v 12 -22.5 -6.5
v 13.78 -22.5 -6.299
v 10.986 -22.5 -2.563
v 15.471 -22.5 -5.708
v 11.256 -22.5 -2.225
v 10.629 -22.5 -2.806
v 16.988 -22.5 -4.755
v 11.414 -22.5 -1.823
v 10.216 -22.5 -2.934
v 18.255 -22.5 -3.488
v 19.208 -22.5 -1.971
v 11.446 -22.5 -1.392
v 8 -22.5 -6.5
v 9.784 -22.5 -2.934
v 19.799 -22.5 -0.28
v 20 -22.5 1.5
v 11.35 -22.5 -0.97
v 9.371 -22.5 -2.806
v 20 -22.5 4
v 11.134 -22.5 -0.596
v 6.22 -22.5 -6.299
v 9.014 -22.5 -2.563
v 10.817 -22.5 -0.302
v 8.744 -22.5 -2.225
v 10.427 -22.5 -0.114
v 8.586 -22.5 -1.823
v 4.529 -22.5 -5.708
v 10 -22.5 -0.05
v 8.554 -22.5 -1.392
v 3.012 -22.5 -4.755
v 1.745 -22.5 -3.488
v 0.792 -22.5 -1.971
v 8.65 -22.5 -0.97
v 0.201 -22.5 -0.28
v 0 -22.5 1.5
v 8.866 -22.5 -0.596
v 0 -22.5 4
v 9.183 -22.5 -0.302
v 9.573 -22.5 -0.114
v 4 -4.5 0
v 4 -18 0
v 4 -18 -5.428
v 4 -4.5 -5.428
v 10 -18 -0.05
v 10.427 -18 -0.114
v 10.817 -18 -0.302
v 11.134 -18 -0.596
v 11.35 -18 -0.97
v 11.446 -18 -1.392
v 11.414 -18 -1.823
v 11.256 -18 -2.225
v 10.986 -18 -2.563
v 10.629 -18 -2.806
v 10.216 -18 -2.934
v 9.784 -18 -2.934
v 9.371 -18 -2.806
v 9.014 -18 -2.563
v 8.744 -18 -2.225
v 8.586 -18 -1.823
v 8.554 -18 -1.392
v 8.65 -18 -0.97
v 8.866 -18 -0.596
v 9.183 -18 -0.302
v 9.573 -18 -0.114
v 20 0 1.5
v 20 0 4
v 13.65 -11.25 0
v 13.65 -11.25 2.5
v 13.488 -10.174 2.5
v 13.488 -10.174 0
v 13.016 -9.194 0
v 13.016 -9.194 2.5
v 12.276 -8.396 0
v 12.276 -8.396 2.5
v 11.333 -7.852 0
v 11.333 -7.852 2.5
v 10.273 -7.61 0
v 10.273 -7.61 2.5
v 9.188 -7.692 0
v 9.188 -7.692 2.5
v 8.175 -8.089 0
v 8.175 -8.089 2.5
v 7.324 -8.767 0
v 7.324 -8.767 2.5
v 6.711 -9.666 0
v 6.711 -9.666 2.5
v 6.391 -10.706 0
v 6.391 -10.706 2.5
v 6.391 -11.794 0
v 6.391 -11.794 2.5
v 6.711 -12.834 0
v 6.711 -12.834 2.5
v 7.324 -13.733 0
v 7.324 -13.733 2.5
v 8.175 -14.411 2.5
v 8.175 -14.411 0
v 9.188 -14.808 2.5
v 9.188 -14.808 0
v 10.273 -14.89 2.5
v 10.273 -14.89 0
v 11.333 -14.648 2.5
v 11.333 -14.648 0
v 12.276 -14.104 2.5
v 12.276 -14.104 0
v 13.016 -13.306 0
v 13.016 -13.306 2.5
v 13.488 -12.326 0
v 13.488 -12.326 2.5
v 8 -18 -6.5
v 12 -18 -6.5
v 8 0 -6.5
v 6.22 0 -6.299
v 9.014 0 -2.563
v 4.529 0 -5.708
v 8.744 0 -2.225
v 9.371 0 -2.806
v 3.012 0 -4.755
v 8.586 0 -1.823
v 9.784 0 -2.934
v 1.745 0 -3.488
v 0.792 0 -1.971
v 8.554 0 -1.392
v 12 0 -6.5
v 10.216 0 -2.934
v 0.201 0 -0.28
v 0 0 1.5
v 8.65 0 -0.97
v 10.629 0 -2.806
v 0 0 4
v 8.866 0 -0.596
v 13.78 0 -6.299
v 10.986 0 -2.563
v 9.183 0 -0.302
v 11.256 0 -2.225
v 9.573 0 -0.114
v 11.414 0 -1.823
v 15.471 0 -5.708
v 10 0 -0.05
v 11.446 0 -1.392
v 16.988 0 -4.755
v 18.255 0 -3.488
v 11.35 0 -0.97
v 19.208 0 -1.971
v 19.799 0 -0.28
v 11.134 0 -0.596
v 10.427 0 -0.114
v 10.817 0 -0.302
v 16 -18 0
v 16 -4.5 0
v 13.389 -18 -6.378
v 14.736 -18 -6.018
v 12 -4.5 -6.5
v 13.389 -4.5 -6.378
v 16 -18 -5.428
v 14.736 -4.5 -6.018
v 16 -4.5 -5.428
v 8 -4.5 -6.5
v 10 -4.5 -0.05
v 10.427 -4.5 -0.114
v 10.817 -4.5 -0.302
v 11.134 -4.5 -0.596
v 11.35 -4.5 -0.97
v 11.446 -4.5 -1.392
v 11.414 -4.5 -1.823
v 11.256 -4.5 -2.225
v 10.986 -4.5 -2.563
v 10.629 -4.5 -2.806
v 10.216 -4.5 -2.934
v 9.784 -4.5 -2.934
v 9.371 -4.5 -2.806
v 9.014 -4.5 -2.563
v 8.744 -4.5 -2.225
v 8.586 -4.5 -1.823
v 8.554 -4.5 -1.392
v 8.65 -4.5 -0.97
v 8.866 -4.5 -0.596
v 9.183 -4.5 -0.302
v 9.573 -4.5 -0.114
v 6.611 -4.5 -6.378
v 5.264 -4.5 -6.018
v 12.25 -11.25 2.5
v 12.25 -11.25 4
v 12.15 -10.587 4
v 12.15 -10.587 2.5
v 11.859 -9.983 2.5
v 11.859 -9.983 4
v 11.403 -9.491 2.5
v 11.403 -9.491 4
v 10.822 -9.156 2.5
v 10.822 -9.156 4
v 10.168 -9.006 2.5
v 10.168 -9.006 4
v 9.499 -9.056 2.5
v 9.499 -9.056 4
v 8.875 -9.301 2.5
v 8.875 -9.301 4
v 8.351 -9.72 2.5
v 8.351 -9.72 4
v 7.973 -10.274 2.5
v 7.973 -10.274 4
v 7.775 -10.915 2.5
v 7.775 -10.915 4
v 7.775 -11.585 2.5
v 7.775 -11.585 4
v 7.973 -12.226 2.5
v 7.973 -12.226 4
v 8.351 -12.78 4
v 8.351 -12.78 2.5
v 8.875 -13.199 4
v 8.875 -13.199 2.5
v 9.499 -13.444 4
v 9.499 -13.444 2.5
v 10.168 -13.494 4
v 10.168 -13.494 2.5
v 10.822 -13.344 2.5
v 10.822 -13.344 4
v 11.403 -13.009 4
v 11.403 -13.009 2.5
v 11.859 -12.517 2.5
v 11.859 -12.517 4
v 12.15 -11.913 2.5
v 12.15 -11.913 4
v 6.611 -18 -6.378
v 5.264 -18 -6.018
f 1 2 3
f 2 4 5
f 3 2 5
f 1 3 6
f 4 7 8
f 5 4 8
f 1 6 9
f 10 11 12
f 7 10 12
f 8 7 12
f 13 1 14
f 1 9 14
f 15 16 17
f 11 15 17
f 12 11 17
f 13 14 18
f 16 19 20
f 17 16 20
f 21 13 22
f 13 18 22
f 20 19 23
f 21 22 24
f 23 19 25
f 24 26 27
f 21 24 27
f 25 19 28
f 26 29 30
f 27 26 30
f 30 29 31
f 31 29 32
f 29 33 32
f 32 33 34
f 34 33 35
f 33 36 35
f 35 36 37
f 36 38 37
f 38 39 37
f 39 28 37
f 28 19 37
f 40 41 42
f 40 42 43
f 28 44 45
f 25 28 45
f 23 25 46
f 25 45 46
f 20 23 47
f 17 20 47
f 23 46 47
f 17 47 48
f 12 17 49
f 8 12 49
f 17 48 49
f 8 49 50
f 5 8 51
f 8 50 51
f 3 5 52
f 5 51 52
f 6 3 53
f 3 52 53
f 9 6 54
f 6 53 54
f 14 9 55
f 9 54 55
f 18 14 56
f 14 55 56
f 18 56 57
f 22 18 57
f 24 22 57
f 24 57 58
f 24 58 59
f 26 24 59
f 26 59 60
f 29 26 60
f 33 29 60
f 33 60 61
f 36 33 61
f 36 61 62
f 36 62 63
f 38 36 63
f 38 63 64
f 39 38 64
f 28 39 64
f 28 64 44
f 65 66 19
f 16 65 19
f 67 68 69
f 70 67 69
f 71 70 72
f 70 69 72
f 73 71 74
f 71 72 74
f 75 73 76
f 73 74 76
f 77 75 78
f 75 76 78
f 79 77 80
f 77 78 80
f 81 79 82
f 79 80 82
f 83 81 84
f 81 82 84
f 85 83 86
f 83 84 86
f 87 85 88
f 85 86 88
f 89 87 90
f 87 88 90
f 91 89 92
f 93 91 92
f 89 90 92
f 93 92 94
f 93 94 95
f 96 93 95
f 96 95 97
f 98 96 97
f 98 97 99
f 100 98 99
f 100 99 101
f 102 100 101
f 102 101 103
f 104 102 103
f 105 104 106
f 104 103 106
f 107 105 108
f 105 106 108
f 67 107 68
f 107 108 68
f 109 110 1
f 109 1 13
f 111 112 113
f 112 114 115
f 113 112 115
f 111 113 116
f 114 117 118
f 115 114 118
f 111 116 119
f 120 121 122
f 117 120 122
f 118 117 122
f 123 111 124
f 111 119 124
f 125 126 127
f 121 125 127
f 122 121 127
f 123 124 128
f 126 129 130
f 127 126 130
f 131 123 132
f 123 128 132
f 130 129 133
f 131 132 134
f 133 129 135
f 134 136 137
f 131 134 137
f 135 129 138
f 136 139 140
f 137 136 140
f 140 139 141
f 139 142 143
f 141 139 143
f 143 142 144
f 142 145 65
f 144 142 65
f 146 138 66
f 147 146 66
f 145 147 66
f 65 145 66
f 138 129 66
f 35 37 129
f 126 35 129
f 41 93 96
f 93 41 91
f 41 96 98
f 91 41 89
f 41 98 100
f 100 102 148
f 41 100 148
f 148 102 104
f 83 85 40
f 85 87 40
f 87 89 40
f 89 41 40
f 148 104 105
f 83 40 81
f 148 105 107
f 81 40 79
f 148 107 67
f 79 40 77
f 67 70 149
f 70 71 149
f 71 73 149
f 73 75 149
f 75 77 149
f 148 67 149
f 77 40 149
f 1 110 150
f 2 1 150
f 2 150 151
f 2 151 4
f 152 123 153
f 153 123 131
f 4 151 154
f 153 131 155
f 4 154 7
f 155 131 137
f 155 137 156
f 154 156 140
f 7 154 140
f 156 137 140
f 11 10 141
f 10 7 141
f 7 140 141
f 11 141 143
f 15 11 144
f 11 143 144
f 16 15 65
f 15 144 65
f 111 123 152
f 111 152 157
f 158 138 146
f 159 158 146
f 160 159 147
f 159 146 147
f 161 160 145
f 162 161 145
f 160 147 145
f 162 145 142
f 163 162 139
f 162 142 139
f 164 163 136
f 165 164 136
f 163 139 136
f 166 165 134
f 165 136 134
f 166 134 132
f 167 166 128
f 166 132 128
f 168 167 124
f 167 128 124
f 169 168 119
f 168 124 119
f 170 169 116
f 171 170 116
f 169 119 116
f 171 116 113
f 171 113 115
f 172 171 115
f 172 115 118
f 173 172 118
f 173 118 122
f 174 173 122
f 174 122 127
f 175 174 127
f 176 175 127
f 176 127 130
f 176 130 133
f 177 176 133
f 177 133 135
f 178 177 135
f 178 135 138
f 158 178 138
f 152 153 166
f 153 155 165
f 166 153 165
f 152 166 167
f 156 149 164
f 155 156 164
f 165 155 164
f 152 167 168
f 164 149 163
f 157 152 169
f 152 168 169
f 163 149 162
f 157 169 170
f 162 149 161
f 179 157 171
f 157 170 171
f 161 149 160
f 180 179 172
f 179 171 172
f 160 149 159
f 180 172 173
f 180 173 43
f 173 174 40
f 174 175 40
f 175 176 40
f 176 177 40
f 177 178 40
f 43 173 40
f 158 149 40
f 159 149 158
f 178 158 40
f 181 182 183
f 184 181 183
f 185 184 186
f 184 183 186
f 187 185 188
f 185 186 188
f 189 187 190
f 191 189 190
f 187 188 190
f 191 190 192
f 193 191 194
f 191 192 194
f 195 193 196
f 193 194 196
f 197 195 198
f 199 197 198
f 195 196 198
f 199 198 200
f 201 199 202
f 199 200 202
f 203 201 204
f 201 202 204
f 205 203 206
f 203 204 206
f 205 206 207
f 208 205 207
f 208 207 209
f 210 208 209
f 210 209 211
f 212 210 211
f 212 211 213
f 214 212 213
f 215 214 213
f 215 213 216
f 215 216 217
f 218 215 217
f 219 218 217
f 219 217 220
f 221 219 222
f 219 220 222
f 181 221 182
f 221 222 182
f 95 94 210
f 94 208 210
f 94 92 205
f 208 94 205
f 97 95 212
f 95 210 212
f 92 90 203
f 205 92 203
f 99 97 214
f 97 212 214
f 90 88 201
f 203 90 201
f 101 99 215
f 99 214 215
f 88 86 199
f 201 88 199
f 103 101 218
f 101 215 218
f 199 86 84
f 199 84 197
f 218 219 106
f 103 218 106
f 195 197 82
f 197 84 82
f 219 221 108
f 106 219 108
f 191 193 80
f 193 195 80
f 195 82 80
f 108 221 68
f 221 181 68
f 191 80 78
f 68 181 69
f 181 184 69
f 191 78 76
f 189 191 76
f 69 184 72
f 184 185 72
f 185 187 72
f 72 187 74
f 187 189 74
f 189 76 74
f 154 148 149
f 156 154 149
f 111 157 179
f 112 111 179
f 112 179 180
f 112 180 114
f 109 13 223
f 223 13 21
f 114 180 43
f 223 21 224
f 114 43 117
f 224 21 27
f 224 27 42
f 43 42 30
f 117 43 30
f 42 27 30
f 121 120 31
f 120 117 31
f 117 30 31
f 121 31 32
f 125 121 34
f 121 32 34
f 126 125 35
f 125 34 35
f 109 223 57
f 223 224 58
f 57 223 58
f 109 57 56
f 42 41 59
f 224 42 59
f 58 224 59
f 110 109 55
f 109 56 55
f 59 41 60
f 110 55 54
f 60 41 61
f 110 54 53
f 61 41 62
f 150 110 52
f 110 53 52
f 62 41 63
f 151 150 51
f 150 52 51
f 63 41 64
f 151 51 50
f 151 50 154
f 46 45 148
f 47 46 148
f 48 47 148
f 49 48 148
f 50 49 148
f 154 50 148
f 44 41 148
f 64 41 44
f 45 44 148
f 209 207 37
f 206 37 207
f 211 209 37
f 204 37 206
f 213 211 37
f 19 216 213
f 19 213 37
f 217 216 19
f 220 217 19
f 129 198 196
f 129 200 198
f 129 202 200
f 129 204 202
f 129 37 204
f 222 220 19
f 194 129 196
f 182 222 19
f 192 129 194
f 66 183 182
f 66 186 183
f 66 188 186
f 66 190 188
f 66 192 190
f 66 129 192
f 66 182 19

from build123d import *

# Parameters (mm, degrees)
SKETCH1_W           = 20
SKETCH1_H           = 22.5
BOSS_EXTRUDE1_DEPTH = 4
SKETCH2_R           = 2.25
CUT_EXTRUDE1_DEPTH  = 1.5
SKETCH3_R           = 3.65
CUT_EXTRUDE2_DEPTH  = 2.5
SKETCH4_W           = 4
SKETCH4_H           = 13.5
BOSS_EXTRUDE2_DEPTH = 6.5
SKETCH5_R           = 1.45
CUT_EXTRUDE3_DEPTH  = 31.797727189
FILLET1_R           = 8


with BuildPart() as part:
    # Sketch1 → Boss-Extrude1 (new body)
    with BuildSketch(Plane.XY):
        with Locations((10, -11.25)):
            Rectangle(SKETCH1_W, SKETCH1_H)
    extrude(amount=BOSS_EXTRUDE1_DEPTH)

    # Sketch2 → Cut-Extrude1 (cut)
    with BuildSketch(Plane.XY.offset(4)):
        with Locations((10, -11.25)):
            Circle(SKETCH2_R)
    extrude(amount=-CUT_EXTRUDE1_DEPTH, mode=Mode.SUBTRACT)

    # Sketch3 → Cut-Extrude2 (cut)
    with BuildSketch(Plane.XY.offset(2.5)):
        with Locations((10, -11.25)):
            Circle(SKETCH3_R)
    extrude(amount=-CUT_EXTRUDE2_DEPTH, mode=Mode.SUBTRACT)

    # Sketch4 → Boss-Extrude2 (add)
    with BuildSketch(Plane(origin=(0, 0, 0), x_dir=(-1, 0, 0), z_dir=(0, 0, -1))):
        with Locations((-18, -11.25)):
            Rectangle(SKETCH4_W, SKETCH4_H)
        Polygon((0, 0), (-20, 0), (-20, -4.5), (-16, -4.5), (-4, -4.5), (0, -4.5), align=None)
        with Locations((-2, -11.25)):
            Rectangle(SKETCH4_W, SKETCH4_H)
        Polygon((-16, -18), (-20, -18), (-20, -22.5), (0, -22.5), (0, -18), (-4, -18), align=None)
    extrude(amount=BOSS_EXTRUDE2_DEPTH)

    # Sketch5 → Cut-Extrude3 (cut, through all)
    with BuildSketch(Plane(origin=(0, 0, 0), x_dir=(1, 0, 0), z_dir=(0, 1, 0))):
        with Locations(Location((10, 1.5, 0), (0, 0, 270))):
            Circle(SKETCH5_R)
    extrude(amount=-CUT_EXTRUDE3_DEPTH, mode=Mode.SUBTRACT)

    # Fillet1
    # the kernel refuses this fillet: 8 mm, written as the material it takes off along each edge
    with BuildSketch(Plane(origin=(0, -42.5, -6.5), x_dir=(0, 0, 1), z_dir=(0, 1, 0)), Plane(origin=(20, 20, -6.5), x_dir=(0, 0, 1), z_dir=(0, -1, 0))) as fillet1_piece_1:
        with BuildLine():
            CenterArc((FILLET1_R, FILLET1_R), FILLET1_R, 180, 90)
            Line((0, FILLET1_R), (0, 0))
            Line((0, 0), (FILLET1_R, 0))
        make_face()
    extrude(amount=62.5, mode=Mode.SUBTRACT)


solid = part.part
